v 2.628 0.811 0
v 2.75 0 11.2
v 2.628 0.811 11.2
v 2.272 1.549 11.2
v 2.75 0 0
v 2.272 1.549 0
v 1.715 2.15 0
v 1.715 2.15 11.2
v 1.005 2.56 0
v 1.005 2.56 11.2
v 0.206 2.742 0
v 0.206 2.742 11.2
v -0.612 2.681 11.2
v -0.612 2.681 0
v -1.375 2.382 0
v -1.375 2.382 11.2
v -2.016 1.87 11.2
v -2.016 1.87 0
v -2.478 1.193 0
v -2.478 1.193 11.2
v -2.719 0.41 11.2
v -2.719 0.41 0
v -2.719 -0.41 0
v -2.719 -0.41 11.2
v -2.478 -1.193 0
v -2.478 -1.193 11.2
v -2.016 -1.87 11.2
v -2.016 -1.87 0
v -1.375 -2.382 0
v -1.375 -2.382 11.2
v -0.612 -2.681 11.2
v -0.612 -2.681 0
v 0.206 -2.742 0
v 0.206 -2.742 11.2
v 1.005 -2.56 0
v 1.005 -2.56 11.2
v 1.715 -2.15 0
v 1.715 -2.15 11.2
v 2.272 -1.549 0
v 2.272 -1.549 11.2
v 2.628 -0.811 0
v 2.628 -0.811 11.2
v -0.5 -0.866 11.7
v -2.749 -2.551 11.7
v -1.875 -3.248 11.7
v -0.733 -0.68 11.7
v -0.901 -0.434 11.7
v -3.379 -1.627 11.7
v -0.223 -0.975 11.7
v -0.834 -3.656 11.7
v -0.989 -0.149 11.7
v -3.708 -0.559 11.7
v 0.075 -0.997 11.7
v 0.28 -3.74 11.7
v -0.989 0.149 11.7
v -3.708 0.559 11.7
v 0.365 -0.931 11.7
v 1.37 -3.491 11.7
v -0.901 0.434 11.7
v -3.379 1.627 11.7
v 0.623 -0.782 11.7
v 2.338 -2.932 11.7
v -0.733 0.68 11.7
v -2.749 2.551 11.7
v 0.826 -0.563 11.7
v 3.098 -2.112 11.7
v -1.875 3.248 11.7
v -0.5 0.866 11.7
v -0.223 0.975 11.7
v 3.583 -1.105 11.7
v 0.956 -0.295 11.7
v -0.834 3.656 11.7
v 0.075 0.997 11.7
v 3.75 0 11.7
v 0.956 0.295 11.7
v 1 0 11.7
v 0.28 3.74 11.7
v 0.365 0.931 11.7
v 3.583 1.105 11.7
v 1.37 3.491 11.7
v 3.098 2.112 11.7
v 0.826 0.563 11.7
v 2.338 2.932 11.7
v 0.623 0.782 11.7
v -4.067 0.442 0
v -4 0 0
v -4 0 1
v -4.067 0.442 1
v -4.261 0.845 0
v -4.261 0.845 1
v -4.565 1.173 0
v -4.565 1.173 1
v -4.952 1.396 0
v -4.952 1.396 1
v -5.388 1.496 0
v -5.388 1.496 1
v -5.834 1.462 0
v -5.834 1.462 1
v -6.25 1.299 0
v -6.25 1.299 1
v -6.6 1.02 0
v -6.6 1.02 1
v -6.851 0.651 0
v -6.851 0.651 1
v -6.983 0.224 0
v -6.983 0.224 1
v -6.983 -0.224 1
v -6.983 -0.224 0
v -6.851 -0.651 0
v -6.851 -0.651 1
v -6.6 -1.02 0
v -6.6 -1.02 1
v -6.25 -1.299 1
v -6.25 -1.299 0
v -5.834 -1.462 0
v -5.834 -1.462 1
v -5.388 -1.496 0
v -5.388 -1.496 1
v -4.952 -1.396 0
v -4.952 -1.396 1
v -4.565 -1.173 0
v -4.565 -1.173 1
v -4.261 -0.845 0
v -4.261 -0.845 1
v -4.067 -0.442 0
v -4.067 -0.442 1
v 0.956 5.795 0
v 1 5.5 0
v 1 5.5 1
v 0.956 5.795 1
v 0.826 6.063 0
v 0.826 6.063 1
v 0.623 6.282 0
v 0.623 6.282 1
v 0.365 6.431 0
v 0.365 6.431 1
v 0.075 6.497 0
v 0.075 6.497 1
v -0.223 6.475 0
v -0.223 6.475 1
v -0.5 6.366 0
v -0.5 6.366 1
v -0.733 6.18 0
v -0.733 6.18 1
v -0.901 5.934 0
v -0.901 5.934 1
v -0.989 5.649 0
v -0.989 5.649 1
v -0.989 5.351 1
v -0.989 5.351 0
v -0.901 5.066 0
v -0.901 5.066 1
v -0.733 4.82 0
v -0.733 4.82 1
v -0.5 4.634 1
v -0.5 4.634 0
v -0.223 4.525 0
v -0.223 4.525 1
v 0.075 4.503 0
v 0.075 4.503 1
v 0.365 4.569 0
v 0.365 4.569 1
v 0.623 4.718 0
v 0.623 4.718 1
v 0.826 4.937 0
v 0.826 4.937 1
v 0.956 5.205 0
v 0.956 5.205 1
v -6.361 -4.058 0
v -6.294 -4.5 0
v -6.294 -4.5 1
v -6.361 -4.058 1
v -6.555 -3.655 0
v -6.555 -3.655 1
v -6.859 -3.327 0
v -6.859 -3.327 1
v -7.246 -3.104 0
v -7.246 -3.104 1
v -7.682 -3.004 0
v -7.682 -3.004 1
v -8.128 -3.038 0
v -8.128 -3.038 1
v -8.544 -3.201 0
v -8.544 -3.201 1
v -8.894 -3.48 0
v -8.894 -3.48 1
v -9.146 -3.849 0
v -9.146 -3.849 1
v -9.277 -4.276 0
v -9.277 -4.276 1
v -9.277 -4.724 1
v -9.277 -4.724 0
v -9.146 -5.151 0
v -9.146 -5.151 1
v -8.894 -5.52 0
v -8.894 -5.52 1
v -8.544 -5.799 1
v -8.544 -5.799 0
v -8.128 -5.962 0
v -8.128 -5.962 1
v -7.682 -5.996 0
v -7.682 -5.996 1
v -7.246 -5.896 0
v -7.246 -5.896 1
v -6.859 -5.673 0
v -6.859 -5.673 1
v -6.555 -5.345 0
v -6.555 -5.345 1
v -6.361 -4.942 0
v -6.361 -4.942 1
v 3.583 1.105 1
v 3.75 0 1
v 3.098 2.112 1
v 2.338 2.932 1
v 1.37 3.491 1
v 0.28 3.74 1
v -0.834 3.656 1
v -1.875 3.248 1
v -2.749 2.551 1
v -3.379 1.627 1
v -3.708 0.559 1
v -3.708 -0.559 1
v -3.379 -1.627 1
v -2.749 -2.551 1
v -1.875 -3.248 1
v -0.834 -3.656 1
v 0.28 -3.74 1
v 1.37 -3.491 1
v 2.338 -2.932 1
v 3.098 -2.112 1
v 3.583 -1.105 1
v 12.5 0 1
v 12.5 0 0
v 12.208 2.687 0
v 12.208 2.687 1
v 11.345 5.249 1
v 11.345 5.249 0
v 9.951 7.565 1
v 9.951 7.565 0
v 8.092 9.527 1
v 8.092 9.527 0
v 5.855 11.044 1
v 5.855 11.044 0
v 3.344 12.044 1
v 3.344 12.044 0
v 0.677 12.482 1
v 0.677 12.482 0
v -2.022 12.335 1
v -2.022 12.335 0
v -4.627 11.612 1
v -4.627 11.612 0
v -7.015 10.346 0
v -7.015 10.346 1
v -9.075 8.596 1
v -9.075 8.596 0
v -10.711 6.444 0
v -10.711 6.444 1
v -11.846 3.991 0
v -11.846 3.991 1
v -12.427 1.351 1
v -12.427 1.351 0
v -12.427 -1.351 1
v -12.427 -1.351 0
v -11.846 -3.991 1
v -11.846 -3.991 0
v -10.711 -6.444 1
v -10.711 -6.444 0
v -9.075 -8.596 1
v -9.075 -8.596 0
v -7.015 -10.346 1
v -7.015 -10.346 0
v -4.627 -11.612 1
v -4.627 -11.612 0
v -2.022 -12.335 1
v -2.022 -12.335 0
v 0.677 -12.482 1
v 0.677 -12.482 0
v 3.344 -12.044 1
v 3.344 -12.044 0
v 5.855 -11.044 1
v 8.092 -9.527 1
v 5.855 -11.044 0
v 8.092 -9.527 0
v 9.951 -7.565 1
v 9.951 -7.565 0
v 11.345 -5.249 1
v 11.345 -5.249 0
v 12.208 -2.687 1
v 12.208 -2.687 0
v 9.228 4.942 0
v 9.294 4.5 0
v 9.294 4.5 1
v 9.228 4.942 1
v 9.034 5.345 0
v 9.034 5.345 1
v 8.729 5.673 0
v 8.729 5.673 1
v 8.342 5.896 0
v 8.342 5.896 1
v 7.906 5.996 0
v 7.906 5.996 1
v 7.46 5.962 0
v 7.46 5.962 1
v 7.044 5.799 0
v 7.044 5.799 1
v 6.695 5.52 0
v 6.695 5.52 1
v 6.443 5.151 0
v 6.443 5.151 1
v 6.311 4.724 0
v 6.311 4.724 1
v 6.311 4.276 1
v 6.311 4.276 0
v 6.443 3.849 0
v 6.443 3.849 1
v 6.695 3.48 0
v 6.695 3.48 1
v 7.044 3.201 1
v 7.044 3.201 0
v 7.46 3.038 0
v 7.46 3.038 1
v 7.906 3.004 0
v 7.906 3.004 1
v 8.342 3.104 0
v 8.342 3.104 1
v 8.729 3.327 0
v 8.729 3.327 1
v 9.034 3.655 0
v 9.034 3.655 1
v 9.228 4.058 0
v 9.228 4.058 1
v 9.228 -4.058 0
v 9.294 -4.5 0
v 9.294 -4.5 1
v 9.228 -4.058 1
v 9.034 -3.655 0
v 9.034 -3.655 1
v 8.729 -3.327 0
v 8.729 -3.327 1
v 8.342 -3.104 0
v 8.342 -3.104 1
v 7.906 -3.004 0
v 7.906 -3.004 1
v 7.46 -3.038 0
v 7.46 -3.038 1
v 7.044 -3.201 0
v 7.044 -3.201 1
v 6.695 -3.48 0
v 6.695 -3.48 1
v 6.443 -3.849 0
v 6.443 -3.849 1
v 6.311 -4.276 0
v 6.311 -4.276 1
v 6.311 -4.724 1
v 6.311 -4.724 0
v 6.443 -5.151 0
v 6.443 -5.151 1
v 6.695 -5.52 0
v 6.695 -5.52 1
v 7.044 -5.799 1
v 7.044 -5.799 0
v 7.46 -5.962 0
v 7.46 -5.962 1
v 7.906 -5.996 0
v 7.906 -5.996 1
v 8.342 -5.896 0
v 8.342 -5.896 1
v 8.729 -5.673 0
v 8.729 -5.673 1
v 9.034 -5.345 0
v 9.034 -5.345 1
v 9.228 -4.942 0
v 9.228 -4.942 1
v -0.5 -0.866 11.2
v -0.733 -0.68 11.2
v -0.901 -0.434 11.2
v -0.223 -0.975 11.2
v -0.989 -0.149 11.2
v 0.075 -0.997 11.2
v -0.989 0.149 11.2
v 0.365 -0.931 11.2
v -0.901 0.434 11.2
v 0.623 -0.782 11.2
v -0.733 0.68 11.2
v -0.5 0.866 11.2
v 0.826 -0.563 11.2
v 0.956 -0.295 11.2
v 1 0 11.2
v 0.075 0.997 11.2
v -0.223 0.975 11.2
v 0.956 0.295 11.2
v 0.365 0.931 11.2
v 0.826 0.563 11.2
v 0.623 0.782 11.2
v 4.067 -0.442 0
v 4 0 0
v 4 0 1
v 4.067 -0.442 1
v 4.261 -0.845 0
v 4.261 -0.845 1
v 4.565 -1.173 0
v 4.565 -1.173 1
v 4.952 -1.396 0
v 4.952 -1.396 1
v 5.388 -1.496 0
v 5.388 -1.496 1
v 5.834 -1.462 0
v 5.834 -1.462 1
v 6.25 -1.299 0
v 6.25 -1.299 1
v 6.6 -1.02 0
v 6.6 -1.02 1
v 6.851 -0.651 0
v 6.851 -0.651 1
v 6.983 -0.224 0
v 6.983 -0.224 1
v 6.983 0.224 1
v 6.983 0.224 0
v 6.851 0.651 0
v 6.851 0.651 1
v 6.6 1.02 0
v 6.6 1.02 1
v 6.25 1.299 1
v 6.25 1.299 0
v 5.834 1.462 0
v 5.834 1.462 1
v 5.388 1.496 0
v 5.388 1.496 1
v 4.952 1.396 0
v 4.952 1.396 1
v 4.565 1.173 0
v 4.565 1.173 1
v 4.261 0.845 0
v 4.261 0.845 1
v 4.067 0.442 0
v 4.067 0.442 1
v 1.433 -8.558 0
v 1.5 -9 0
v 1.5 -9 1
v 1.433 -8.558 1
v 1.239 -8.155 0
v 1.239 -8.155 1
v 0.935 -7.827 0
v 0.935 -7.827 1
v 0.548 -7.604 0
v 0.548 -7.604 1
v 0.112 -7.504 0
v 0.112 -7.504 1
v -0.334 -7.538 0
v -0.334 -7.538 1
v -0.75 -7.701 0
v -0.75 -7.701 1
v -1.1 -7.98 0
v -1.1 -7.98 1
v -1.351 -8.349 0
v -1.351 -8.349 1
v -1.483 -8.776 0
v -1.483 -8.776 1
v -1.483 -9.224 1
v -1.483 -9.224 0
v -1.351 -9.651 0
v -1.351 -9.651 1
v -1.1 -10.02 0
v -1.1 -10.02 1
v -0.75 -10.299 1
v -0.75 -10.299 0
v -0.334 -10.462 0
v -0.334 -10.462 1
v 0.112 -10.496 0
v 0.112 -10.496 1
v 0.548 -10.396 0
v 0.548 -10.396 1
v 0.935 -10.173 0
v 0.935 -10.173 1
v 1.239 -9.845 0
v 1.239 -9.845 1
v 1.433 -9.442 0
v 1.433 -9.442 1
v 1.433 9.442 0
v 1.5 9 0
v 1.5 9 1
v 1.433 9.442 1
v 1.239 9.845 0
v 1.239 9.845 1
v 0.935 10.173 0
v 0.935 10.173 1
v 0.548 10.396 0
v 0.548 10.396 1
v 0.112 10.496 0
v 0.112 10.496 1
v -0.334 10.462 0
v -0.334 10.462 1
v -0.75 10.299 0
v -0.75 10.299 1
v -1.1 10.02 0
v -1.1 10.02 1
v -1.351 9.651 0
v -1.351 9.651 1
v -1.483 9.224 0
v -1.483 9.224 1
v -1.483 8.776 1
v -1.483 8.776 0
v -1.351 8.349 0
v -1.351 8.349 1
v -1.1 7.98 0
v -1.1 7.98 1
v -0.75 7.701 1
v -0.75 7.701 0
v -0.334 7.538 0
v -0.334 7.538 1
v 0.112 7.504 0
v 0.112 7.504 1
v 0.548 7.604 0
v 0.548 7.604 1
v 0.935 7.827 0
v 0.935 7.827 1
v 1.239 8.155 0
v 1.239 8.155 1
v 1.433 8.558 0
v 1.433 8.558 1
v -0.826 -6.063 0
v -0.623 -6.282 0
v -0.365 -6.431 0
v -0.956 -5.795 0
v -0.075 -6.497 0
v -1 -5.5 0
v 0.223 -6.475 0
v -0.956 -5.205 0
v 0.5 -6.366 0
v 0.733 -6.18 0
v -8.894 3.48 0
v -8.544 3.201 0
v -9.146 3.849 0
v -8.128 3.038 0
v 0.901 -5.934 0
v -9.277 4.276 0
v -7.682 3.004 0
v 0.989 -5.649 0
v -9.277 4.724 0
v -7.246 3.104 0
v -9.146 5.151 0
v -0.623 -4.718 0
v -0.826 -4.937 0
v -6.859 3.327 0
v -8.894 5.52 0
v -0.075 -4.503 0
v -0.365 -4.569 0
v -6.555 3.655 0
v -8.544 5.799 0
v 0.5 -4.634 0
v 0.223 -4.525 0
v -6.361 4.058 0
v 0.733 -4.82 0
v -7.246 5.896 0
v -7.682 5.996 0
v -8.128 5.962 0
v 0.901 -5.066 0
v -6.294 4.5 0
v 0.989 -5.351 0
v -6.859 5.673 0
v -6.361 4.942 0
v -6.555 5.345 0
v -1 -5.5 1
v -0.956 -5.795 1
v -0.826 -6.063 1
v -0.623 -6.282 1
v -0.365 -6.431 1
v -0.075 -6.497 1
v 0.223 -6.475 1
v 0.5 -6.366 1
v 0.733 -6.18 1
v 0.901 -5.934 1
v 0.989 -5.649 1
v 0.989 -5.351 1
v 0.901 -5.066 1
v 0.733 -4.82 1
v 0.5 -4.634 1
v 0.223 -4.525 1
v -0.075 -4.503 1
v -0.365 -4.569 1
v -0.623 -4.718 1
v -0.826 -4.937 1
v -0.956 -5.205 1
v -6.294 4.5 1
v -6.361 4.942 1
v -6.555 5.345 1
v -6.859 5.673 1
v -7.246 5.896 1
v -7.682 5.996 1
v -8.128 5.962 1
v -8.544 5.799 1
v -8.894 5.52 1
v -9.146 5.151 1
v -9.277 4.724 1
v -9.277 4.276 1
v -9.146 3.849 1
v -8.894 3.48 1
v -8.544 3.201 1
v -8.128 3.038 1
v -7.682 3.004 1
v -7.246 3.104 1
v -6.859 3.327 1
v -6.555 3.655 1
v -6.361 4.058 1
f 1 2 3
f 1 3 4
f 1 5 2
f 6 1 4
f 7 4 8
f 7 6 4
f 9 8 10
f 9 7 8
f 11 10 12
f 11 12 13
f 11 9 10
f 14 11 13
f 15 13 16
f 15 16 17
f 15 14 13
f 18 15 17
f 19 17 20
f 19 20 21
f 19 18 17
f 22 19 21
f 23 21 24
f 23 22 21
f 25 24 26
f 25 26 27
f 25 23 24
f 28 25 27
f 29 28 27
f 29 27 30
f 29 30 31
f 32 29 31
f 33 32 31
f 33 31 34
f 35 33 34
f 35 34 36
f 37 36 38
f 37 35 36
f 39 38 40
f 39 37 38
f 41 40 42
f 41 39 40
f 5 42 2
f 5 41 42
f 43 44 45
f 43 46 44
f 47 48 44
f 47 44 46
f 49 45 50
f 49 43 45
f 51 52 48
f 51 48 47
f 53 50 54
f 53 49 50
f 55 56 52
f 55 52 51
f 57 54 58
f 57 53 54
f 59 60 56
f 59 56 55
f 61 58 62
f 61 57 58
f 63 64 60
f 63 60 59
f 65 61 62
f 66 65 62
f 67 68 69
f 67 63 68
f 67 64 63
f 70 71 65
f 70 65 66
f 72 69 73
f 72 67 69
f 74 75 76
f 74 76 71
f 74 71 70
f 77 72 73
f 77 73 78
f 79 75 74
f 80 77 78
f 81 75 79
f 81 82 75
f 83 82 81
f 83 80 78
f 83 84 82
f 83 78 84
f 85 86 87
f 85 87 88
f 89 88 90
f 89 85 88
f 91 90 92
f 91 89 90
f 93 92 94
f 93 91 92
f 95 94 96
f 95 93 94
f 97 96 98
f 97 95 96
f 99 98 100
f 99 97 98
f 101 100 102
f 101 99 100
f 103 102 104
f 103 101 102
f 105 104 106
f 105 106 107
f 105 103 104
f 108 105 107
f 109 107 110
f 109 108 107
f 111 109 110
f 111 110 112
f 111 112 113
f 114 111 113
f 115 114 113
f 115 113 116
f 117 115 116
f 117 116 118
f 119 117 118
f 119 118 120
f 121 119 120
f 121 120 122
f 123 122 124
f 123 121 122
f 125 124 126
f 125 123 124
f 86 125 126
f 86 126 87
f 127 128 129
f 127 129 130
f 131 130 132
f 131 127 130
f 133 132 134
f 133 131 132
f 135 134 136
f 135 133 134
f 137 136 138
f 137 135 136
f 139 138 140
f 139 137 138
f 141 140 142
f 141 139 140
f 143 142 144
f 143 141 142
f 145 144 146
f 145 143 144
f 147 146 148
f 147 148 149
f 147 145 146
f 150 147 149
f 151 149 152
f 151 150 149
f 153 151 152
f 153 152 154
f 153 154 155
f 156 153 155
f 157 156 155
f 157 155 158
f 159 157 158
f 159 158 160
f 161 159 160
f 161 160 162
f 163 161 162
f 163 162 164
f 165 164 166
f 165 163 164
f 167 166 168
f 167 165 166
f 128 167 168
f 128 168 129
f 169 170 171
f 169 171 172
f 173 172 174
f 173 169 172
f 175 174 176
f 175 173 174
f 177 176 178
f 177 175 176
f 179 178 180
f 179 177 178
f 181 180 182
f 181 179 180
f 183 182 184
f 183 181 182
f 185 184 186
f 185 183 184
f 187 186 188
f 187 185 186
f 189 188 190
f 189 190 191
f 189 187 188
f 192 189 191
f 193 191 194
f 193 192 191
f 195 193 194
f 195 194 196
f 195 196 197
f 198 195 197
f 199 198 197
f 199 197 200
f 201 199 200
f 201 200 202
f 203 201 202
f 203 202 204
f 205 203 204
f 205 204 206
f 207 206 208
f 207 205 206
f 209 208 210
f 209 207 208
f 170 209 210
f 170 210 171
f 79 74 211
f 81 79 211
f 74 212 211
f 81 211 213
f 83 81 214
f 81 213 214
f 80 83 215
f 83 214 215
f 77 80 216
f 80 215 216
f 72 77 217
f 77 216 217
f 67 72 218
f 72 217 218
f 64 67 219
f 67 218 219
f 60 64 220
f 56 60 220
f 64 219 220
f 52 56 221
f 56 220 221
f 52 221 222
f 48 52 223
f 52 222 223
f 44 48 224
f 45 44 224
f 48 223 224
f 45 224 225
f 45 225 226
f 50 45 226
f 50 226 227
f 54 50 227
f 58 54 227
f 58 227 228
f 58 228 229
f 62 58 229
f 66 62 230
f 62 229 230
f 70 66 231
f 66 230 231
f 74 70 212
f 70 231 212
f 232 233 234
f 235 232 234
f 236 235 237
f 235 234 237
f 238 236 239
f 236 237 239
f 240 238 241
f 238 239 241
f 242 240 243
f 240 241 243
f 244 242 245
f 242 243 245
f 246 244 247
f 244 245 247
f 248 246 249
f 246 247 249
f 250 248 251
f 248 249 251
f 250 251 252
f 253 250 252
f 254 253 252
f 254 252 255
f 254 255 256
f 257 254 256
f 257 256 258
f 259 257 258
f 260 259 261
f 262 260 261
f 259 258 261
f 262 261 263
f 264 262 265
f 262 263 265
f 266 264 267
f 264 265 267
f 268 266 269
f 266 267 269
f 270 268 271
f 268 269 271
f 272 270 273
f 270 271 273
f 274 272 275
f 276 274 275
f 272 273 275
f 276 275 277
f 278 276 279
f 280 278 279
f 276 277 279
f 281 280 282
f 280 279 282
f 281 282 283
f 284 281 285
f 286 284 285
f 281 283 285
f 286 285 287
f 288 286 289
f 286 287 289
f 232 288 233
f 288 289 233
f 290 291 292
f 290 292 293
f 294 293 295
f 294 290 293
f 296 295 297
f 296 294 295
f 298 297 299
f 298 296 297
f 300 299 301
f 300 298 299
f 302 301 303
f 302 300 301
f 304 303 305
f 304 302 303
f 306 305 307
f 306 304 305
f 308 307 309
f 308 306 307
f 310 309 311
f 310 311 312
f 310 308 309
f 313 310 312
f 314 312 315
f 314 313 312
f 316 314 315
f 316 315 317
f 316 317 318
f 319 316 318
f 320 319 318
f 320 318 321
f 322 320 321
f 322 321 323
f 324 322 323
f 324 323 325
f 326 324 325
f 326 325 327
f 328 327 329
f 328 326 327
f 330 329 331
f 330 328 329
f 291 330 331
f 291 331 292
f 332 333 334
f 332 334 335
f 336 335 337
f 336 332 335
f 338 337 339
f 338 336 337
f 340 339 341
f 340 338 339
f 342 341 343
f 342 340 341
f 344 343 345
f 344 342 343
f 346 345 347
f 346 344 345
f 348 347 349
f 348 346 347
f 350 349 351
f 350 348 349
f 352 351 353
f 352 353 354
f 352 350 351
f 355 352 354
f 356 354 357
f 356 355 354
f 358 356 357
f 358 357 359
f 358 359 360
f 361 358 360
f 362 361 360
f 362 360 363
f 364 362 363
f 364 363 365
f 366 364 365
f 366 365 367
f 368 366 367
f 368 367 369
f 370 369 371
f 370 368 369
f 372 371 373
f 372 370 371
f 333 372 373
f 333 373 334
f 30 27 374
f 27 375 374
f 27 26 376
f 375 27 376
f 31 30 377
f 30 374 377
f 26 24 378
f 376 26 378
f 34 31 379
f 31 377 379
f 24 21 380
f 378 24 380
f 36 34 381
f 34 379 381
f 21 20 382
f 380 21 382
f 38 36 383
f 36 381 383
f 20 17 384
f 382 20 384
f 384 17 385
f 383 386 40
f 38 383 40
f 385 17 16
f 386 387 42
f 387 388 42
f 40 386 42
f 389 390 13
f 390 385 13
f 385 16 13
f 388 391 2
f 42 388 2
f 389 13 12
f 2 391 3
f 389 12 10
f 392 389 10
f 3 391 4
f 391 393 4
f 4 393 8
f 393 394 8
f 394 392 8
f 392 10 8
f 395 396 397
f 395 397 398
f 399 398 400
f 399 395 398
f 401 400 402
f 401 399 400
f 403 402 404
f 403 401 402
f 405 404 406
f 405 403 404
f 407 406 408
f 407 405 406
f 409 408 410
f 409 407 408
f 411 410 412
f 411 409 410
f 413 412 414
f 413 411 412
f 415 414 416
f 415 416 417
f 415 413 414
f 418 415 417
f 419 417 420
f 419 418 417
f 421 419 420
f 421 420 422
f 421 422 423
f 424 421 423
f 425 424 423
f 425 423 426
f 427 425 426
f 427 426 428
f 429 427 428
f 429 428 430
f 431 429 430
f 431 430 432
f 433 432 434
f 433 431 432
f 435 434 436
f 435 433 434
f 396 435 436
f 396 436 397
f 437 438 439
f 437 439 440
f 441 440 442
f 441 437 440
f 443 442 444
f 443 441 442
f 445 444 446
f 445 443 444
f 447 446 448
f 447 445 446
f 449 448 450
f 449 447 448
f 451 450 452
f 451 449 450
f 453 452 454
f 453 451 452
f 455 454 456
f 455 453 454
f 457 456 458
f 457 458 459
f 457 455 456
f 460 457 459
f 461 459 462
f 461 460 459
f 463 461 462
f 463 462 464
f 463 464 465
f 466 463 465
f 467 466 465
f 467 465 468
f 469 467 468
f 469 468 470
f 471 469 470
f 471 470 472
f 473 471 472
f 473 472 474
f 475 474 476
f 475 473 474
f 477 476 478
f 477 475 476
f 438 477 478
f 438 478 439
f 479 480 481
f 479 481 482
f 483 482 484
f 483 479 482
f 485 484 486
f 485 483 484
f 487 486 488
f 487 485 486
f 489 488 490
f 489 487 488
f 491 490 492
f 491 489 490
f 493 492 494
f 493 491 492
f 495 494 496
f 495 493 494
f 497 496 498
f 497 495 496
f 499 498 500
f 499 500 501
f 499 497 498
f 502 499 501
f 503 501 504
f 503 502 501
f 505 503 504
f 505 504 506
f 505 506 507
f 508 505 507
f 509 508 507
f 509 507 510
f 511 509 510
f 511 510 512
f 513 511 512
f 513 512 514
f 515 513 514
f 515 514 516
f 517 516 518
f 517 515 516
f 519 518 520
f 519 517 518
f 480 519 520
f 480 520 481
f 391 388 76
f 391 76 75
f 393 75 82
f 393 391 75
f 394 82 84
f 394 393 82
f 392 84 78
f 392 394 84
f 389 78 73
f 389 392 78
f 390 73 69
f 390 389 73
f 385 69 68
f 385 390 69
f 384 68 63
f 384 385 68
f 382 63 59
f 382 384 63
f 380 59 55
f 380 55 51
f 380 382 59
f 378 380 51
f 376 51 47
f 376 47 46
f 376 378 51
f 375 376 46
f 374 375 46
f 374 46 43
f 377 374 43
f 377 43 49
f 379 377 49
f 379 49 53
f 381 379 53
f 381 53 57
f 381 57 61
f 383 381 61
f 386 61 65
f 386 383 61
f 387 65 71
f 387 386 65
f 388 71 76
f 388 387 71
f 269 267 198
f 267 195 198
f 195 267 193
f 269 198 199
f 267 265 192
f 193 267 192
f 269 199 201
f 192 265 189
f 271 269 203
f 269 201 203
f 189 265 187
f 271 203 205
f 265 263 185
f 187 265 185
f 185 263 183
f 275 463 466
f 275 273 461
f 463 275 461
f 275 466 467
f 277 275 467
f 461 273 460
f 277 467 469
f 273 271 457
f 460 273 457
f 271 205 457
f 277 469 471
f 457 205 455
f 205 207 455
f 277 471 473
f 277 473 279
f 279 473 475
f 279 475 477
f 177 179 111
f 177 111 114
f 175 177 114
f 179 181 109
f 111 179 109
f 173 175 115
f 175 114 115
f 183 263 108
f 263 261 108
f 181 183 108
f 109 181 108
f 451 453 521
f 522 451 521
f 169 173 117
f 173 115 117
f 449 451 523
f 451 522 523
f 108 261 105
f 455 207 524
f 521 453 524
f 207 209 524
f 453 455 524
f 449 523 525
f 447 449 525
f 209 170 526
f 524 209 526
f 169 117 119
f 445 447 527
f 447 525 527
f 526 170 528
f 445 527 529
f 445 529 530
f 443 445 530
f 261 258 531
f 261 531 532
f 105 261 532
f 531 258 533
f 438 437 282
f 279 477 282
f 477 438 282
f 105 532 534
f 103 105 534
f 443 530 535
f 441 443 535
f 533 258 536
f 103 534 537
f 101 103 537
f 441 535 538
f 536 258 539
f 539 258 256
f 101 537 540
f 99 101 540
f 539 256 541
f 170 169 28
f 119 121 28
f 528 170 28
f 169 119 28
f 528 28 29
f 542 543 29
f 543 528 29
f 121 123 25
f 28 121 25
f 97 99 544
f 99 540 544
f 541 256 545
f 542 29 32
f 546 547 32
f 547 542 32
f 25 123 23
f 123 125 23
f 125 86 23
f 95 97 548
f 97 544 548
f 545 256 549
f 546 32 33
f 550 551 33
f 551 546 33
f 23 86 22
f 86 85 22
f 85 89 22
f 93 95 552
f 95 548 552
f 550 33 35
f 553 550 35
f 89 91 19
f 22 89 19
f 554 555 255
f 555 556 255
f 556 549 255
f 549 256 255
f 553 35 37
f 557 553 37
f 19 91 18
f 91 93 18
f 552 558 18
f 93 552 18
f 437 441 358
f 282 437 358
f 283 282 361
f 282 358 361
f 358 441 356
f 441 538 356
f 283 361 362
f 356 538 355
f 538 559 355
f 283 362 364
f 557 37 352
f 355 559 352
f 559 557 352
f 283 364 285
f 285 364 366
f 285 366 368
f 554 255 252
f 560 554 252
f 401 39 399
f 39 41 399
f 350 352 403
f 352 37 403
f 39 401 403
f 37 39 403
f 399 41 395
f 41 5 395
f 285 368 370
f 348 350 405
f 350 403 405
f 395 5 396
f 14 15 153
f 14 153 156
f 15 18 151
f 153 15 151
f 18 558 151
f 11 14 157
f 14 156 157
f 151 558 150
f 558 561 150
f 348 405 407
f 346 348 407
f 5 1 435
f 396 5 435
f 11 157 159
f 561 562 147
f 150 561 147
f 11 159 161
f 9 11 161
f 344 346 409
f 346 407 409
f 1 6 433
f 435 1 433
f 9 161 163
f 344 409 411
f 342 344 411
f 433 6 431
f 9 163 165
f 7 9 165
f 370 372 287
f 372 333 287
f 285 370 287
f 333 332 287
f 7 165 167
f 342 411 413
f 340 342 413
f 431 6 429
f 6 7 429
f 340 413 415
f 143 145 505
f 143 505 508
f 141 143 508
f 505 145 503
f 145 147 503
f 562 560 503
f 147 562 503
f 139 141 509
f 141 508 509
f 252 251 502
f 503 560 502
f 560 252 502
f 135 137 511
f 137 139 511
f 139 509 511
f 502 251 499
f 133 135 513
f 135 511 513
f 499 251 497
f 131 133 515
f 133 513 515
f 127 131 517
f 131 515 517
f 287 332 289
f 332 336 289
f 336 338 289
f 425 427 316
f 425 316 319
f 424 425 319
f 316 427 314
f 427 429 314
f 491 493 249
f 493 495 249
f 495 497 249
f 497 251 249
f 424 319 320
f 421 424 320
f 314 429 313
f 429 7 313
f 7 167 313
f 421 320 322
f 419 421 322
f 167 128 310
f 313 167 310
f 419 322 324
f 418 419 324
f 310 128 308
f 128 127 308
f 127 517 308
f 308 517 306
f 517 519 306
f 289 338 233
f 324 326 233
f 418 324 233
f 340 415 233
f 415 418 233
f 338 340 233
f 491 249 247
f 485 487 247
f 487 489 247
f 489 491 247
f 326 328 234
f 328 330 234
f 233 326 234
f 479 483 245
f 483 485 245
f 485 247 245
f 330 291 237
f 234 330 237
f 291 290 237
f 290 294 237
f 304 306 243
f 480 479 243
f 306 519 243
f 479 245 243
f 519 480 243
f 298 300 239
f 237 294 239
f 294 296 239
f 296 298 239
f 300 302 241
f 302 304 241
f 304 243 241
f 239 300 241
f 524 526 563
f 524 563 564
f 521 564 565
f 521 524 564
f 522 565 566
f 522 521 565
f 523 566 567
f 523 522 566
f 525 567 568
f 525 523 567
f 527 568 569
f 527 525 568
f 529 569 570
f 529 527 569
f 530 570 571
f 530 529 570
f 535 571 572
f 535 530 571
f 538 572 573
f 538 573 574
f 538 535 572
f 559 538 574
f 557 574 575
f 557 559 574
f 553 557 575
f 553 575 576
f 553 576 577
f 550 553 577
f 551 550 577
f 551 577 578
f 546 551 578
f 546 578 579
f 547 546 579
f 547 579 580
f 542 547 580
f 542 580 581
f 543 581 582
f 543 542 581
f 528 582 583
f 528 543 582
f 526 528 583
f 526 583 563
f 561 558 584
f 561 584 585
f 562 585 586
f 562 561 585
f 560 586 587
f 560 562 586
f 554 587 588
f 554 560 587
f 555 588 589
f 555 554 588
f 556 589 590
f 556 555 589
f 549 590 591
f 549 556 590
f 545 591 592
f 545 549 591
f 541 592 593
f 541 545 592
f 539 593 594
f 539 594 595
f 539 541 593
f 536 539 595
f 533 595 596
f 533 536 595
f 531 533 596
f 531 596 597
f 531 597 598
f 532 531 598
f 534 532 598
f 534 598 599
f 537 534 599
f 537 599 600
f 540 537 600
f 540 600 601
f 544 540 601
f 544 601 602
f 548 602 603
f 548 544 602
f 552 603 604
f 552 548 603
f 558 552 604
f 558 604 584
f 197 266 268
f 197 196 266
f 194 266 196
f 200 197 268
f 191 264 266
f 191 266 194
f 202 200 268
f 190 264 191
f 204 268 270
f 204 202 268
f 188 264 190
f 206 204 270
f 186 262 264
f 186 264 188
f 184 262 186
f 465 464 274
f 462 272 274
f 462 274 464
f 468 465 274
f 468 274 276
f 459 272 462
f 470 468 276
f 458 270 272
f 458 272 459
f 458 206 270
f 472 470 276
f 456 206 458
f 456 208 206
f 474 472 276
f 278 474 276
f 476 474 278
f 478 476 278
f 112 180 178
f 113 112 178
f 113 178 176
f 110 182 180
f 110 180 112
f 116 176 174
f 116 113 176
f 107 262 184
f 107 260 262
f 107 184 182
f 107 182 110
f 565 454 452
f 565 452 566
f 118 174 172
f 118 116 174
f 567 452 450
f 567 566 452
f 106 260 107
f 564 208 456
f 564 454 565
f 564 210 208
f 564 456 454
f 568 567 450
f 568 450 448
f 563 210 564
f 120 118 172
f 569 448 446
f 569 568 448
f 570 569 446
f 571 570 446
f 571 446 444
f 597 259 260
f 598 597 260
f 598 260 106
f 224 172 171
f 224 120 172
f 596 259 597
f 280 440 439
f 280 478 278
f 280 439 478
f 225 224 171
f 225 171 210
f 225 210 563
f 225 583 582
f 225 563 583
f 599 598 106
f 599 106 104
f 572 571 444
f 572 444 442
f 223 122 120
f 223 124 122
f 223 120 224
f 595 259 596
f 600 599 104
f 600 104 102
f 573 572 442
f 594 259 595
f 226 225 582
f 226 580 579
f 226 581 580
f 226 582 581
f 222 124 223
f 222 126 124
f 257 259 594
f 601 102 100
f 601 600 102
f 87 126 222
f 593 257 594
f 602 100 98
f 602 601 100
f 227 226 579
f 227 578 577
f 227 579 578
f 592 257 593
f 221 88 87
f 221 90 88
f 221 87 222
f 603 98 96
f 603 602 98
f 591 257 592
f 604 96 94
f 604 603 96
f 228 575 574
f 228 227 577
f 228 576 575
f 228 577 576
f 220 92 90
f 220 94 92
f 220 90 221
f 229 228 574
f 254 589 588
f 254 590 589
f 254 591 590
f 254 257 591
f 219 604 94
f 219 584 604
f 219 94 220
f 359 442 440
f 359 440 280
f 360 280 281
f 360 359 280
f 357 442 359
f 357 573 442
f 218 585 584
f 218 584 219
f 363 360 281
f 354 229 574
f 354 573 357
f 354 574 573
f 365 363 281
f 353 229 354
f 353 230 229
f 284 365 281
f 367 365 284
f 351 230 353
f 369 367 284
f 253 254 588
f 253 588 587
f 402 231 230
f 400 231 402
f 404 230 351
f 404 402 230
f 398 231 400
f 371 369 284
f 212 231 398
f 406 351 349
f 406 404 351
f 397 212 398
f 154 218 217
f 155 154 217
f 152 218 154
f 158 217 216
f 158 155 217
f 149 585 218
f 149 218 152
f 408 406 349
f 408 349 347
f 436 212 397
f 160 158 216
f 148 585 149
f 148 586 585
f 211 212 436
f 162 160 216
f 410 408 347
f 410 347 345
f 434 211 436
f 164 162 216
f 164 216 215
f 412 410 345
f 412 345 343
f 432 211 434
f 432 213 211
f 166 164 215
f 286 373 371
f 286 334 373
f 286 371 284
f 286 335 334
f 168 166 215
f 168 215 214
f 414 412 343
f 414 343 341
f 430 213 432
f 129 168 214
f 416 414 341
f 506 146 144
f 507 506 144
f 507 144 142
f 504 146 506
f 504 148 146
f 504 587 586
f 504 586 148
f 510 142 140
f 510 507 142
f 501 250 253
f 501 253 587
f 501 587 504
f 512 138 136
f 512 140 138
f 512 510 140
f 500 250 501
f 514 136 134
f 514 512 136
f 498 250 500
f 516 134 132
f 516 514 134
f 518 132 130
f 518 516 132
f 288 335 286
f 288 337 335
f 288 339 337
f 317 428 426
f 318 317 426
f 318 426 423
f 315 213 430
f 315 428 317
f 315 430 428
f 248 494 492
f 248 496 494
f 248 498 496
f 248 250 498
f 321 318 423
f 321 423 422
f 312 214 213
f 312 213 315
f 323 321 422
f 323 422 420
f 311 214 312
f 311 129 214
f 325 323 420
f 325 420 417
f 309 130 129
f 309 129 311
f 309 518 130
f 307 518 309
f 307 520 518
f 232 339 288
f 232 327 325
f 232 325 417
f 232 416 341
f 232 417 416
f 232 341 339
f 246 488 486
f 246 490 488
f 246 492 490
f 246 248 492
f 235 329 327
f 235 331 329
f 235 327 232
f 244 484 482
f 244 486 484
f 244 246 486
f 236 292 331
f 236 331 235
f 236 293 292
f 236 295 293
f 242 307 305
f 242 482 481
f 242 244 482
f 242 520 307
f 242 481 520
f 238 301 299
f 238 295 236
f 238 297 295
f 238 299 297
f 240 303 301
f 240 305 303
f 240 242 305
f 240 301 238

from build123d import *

# Parameters (mm, degrees)
SKETCH_1_R      = 12.5
SKETCH_1_R_2    = 2.75
SKETCH_1_R_3    = 1.5
SKETCH_1_R_4    = 1
EXTRUDE_1_DEPTH = 1
SKETCH_2_R      = 3.75
SKETCH_2_R_2    = 2.75
EXTRUDE_2_DEPTH = 10.2
SKETCH_3_R      = 3.75
SKETCH_3_R_2    = 1
EXTRUDE_3_DEPTH = 0.5


with BuildPart() as part:
    # Эскиз1 → Бобышка-Вытянуть1 (new body)
    with BuildSketch(Plane.XY):
        Circle(SKETCH_1_R)
        Circle(SKETCH_1_R_2, mode=Mode.SUBTRACT)
        with Locations((0, 9)):
            Circle(SKETCH_1_R_3, mode=Mode.SUBTRACT)
        with Locations((7.794228634, 4.5)):
            Circle(SKETCH_1_R_3, mode=Mode.SUBTRACT)
        with Locations((7.794228634, -4.5)):
            Circle(SKETCH_1_R_3, mode=Mode.SUBTRACT)
        with Locations((0, -9)):
            Circle(SKETCH_1_R_3, mode=Mode.SUBTRACT)
        with Locations((-7.794228634, -4.5)):
            Circle(SKETCH_1_R_3, mode=Mode.SUBTRACT)
        with Locations((-7.794228634, 4.5)):
            Circle(SKETCH_1_R_3, mode=Mode.SUBTRACT)
        with Locations((-5.5, 0)):
            Circle(SKETCH_1_R_3, mode=Mode.SUBTRACT)
        with Locations(Location((5.5, 0, 0), (0, 0, 180))):
            Circle(SKETCH_1_R_3, mode=Mode.SUBTRACT)
        with Locations((0, 5.5)):
            Circle(SKETCH_1_R_4, mode=Mode.SUBTRACT)
        with Locations(Location((0, -5.5, 0), (0, 0, 180))):
            Circle(SKETCH_1_R_4, mode=Mode.SUBTRACT)
    extrude(amount=EXTRUDE_1_DEPTH)

    # Эскиз2 → Бобышка-Вытянуть2 (add)
    with BuildSketch(Plane.XY.offset(1)):
        Circle(SKETCH_2_R)
        Circle(SKETCH_2_R_2, mode=Mode.SUBTRACT)
    extrude(amount=EXTRUDE_2_DEPTH)

    # Эскиз3 → Бобышка-Вытянуть3 (add)
    with BuildSketch(Plane.XY.offset(11.2)):
        Circle(SKETCH_3_R)
        Circle(SKETCH_3_R_2, mode=Mode.SUBTRACT)
    extrude(amount=EXTRUDE_3_DEPTH)


solid = part.part
